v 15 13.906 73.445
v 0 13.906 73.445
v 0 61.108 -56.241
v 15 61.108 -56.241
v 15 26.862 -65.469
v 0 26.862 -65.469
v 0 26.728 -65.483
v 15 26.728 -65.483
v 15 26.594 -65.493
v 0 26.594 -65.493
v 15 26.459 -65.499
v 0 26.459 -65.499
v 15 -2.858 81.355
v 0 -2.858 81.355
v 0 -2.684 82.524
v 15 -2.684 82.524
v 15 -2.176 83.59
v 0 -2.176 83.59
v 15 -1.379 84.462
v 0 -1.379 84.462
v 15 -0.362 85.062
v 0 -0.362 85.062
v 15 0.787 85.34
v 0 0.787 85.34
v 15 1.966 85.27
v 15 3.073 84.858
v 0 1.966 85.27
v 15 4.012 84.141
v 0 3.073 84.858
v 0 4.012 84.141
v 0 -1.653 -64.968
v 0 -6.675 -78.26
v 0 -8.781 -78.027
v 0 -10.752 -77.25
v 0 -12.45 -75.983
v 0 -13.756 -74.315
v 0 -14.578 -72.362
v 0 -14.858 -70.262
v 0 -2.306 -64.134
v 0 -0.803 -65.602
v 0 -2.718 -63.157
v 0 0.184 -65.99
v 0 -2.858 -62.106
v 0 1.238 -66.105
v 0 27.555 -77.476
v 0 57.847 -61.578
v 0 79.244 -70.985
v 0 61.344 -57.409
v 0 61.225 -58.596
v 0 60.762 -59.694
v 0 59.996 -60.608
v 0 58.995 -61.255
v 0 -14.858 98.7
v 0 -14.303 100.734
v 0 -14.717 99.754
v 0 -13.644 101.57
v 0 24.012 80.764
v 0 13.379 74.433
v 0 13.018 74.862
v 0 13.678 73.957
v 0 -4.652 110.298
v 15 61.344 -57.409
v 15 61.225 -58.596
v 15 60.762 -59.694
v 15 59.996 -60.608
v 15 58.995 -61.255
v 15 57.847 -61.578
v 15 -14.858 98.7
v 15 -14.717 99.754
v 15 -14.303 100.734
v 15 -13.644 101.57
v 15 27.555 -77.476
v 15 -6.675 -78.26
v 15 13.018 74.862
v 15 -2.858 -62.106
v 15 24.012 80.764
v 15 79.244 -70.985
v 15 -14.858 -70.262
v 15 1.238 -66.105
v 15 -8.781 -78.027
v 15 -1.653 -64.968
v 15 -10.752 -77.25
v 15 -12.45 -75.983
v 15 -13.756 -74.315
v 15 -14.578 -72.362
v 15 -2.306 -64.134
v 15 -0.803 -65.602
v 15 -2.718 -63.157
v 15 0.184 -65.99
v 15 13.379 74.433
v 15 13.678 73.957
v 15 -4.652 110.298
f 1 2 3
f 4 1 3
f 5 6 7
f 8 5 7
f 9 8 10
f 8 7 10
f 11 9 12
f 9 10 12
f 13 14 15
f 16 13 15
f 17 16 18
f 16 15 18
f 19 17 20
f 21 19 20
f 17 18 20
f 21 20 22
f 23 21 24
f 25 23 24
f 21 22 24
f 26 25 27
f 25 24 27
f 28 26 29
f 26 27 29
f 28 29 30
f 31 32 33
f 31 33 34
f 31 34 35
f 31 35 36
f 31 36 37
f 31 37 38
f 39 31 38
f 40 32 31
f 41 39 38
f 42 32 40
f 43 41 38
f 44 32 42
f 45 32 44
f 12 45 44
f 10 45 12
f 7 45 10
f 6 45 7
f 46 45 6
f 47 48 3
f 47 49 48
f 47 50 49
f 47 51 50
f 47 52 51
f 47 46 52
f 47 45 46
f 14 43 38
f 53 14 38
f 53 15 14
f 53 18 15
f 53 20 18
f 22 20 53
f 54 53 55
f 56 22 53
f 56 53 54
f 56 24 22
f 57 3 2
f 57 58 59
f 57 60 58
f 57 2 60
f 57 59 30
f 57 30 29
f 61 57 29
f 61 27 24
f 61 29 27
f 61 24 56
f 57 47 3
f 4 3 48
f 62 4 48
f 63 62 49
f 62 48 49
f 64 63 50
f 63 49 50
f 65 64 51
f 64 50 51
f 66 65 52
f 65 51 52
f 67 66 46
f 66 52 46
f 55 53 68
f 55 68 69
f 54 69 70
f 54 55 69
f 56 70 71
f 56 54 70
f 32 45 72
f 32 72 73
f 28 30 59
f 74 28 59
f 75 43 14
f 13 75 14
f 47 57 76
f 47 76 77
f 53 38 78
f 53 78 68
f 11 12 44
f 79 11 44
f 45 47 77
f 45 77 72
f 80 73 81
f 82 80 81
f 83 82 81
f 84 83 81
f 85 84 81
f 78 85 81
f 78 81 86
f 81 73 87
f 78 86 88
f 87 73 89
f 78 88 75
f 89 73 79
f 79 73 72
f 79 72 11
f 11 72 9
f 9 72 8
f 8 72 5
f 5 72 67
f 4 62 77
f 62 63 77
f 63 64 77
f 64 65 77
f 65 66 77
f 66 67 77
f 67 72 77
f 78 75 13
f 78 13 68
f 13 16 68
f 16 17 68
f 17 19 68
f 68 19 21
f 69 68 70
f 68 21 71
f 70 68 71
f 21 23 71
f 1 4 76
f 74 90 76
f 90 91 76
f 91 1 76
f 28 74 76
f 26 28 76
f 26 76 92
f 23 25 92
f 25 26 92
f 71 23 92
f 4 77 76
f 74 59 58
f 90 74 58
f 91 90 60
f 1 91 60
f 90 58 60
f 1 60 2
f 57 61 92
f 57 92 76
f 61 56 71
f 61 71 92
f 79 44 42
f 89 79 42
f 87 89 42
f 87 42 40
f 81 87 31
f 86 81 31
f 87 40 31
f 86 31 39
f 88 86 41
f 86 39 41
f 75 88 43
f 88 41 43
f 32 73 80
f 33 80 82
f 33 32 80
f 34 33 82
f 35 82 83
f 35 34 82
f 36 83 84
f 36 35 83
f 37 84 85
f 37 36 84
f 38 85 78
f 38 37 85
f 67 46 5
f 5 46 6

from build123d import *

# Parameters (mm, degrees)
BOSS_EXTRUDE1_DEPTH = 15


with BuildPart() as part:
    # Sketch1 → Boss-Extrude1 (new body)
    with BuildSketch(Plane(origin=(0, 0, 0), x_dir=(0, 0, -1), z_dir=(1, 0, 0))):
        with BuildLine():
            Line((-80.764356581, 24.012047683), (70.985255082, 79.244389389))
            Line((70.985255082, 79.244389389), (77.475739843, 27.555189639))
            Line((77.475739843, 27.555189639), (78.259876122, -6.675276303))
            ThreePointArc((78.259876122, -6.675276303), (75.98323725, -12.450192398), (70.261974321, -14.858488677))
            Line((70.261974321, -14.858488677), (-98.699643506, -14.858488677))
            ThreePointArc((-98.699643506, -14.858488677), (-100.257936009, -14.542470826), (-101.570004389, -13.644350914))
            Line((-101.570004389, -13.644350914), (-110.297725107, -4.651907634))
            Line((-110.297725107, -4.651907634), (-80.764356581, 24.012047683))
        make_face()
        with BuildLine():
            Line((-73.444540709, 13.906109511), (56.240883381, 61.107743698))
            ThreePointArc((56.240883381, 61.107743698), (59.694282591, 60.762394692), (61.577797623, 57.847329826))
            Line((61.577797623, 57.847329826), (65.468609196, 26.861518446))
            ThreePointArc((65.468609196, 26.861518446), (65.488687358, 26.660789803), (65.498619942, 26.45930416))
            Line((65.498619942, 26.45930416), (66.105012162, 1.237653648))
            ThreePointArc((66.105012162, 1.237653648), (64.968384485, -1.652717614), (62.106167747, -2.858488677))
            Line((62.106167747, -2.858488677), (-81.355445731, -2.858488677))
            ThreePointArc((-81.355445731, -2.858488677), (-85.062293687, -0.36157824), (-84.141307968, 4.011872206))
            Line((-84.141307968, 4.011872206), (-74.862322373, 13.017699911))
            ThreePointArc((-74.862322373, 13.017699911), (-74.200401783, 13.53686287), (-73.444540709, 13.906109511))
        make_face(mode=Mode.SUBTRACT)
    extrude(amount=BOSS_EXTRUDE1_DEPTH)


solid = part.part
